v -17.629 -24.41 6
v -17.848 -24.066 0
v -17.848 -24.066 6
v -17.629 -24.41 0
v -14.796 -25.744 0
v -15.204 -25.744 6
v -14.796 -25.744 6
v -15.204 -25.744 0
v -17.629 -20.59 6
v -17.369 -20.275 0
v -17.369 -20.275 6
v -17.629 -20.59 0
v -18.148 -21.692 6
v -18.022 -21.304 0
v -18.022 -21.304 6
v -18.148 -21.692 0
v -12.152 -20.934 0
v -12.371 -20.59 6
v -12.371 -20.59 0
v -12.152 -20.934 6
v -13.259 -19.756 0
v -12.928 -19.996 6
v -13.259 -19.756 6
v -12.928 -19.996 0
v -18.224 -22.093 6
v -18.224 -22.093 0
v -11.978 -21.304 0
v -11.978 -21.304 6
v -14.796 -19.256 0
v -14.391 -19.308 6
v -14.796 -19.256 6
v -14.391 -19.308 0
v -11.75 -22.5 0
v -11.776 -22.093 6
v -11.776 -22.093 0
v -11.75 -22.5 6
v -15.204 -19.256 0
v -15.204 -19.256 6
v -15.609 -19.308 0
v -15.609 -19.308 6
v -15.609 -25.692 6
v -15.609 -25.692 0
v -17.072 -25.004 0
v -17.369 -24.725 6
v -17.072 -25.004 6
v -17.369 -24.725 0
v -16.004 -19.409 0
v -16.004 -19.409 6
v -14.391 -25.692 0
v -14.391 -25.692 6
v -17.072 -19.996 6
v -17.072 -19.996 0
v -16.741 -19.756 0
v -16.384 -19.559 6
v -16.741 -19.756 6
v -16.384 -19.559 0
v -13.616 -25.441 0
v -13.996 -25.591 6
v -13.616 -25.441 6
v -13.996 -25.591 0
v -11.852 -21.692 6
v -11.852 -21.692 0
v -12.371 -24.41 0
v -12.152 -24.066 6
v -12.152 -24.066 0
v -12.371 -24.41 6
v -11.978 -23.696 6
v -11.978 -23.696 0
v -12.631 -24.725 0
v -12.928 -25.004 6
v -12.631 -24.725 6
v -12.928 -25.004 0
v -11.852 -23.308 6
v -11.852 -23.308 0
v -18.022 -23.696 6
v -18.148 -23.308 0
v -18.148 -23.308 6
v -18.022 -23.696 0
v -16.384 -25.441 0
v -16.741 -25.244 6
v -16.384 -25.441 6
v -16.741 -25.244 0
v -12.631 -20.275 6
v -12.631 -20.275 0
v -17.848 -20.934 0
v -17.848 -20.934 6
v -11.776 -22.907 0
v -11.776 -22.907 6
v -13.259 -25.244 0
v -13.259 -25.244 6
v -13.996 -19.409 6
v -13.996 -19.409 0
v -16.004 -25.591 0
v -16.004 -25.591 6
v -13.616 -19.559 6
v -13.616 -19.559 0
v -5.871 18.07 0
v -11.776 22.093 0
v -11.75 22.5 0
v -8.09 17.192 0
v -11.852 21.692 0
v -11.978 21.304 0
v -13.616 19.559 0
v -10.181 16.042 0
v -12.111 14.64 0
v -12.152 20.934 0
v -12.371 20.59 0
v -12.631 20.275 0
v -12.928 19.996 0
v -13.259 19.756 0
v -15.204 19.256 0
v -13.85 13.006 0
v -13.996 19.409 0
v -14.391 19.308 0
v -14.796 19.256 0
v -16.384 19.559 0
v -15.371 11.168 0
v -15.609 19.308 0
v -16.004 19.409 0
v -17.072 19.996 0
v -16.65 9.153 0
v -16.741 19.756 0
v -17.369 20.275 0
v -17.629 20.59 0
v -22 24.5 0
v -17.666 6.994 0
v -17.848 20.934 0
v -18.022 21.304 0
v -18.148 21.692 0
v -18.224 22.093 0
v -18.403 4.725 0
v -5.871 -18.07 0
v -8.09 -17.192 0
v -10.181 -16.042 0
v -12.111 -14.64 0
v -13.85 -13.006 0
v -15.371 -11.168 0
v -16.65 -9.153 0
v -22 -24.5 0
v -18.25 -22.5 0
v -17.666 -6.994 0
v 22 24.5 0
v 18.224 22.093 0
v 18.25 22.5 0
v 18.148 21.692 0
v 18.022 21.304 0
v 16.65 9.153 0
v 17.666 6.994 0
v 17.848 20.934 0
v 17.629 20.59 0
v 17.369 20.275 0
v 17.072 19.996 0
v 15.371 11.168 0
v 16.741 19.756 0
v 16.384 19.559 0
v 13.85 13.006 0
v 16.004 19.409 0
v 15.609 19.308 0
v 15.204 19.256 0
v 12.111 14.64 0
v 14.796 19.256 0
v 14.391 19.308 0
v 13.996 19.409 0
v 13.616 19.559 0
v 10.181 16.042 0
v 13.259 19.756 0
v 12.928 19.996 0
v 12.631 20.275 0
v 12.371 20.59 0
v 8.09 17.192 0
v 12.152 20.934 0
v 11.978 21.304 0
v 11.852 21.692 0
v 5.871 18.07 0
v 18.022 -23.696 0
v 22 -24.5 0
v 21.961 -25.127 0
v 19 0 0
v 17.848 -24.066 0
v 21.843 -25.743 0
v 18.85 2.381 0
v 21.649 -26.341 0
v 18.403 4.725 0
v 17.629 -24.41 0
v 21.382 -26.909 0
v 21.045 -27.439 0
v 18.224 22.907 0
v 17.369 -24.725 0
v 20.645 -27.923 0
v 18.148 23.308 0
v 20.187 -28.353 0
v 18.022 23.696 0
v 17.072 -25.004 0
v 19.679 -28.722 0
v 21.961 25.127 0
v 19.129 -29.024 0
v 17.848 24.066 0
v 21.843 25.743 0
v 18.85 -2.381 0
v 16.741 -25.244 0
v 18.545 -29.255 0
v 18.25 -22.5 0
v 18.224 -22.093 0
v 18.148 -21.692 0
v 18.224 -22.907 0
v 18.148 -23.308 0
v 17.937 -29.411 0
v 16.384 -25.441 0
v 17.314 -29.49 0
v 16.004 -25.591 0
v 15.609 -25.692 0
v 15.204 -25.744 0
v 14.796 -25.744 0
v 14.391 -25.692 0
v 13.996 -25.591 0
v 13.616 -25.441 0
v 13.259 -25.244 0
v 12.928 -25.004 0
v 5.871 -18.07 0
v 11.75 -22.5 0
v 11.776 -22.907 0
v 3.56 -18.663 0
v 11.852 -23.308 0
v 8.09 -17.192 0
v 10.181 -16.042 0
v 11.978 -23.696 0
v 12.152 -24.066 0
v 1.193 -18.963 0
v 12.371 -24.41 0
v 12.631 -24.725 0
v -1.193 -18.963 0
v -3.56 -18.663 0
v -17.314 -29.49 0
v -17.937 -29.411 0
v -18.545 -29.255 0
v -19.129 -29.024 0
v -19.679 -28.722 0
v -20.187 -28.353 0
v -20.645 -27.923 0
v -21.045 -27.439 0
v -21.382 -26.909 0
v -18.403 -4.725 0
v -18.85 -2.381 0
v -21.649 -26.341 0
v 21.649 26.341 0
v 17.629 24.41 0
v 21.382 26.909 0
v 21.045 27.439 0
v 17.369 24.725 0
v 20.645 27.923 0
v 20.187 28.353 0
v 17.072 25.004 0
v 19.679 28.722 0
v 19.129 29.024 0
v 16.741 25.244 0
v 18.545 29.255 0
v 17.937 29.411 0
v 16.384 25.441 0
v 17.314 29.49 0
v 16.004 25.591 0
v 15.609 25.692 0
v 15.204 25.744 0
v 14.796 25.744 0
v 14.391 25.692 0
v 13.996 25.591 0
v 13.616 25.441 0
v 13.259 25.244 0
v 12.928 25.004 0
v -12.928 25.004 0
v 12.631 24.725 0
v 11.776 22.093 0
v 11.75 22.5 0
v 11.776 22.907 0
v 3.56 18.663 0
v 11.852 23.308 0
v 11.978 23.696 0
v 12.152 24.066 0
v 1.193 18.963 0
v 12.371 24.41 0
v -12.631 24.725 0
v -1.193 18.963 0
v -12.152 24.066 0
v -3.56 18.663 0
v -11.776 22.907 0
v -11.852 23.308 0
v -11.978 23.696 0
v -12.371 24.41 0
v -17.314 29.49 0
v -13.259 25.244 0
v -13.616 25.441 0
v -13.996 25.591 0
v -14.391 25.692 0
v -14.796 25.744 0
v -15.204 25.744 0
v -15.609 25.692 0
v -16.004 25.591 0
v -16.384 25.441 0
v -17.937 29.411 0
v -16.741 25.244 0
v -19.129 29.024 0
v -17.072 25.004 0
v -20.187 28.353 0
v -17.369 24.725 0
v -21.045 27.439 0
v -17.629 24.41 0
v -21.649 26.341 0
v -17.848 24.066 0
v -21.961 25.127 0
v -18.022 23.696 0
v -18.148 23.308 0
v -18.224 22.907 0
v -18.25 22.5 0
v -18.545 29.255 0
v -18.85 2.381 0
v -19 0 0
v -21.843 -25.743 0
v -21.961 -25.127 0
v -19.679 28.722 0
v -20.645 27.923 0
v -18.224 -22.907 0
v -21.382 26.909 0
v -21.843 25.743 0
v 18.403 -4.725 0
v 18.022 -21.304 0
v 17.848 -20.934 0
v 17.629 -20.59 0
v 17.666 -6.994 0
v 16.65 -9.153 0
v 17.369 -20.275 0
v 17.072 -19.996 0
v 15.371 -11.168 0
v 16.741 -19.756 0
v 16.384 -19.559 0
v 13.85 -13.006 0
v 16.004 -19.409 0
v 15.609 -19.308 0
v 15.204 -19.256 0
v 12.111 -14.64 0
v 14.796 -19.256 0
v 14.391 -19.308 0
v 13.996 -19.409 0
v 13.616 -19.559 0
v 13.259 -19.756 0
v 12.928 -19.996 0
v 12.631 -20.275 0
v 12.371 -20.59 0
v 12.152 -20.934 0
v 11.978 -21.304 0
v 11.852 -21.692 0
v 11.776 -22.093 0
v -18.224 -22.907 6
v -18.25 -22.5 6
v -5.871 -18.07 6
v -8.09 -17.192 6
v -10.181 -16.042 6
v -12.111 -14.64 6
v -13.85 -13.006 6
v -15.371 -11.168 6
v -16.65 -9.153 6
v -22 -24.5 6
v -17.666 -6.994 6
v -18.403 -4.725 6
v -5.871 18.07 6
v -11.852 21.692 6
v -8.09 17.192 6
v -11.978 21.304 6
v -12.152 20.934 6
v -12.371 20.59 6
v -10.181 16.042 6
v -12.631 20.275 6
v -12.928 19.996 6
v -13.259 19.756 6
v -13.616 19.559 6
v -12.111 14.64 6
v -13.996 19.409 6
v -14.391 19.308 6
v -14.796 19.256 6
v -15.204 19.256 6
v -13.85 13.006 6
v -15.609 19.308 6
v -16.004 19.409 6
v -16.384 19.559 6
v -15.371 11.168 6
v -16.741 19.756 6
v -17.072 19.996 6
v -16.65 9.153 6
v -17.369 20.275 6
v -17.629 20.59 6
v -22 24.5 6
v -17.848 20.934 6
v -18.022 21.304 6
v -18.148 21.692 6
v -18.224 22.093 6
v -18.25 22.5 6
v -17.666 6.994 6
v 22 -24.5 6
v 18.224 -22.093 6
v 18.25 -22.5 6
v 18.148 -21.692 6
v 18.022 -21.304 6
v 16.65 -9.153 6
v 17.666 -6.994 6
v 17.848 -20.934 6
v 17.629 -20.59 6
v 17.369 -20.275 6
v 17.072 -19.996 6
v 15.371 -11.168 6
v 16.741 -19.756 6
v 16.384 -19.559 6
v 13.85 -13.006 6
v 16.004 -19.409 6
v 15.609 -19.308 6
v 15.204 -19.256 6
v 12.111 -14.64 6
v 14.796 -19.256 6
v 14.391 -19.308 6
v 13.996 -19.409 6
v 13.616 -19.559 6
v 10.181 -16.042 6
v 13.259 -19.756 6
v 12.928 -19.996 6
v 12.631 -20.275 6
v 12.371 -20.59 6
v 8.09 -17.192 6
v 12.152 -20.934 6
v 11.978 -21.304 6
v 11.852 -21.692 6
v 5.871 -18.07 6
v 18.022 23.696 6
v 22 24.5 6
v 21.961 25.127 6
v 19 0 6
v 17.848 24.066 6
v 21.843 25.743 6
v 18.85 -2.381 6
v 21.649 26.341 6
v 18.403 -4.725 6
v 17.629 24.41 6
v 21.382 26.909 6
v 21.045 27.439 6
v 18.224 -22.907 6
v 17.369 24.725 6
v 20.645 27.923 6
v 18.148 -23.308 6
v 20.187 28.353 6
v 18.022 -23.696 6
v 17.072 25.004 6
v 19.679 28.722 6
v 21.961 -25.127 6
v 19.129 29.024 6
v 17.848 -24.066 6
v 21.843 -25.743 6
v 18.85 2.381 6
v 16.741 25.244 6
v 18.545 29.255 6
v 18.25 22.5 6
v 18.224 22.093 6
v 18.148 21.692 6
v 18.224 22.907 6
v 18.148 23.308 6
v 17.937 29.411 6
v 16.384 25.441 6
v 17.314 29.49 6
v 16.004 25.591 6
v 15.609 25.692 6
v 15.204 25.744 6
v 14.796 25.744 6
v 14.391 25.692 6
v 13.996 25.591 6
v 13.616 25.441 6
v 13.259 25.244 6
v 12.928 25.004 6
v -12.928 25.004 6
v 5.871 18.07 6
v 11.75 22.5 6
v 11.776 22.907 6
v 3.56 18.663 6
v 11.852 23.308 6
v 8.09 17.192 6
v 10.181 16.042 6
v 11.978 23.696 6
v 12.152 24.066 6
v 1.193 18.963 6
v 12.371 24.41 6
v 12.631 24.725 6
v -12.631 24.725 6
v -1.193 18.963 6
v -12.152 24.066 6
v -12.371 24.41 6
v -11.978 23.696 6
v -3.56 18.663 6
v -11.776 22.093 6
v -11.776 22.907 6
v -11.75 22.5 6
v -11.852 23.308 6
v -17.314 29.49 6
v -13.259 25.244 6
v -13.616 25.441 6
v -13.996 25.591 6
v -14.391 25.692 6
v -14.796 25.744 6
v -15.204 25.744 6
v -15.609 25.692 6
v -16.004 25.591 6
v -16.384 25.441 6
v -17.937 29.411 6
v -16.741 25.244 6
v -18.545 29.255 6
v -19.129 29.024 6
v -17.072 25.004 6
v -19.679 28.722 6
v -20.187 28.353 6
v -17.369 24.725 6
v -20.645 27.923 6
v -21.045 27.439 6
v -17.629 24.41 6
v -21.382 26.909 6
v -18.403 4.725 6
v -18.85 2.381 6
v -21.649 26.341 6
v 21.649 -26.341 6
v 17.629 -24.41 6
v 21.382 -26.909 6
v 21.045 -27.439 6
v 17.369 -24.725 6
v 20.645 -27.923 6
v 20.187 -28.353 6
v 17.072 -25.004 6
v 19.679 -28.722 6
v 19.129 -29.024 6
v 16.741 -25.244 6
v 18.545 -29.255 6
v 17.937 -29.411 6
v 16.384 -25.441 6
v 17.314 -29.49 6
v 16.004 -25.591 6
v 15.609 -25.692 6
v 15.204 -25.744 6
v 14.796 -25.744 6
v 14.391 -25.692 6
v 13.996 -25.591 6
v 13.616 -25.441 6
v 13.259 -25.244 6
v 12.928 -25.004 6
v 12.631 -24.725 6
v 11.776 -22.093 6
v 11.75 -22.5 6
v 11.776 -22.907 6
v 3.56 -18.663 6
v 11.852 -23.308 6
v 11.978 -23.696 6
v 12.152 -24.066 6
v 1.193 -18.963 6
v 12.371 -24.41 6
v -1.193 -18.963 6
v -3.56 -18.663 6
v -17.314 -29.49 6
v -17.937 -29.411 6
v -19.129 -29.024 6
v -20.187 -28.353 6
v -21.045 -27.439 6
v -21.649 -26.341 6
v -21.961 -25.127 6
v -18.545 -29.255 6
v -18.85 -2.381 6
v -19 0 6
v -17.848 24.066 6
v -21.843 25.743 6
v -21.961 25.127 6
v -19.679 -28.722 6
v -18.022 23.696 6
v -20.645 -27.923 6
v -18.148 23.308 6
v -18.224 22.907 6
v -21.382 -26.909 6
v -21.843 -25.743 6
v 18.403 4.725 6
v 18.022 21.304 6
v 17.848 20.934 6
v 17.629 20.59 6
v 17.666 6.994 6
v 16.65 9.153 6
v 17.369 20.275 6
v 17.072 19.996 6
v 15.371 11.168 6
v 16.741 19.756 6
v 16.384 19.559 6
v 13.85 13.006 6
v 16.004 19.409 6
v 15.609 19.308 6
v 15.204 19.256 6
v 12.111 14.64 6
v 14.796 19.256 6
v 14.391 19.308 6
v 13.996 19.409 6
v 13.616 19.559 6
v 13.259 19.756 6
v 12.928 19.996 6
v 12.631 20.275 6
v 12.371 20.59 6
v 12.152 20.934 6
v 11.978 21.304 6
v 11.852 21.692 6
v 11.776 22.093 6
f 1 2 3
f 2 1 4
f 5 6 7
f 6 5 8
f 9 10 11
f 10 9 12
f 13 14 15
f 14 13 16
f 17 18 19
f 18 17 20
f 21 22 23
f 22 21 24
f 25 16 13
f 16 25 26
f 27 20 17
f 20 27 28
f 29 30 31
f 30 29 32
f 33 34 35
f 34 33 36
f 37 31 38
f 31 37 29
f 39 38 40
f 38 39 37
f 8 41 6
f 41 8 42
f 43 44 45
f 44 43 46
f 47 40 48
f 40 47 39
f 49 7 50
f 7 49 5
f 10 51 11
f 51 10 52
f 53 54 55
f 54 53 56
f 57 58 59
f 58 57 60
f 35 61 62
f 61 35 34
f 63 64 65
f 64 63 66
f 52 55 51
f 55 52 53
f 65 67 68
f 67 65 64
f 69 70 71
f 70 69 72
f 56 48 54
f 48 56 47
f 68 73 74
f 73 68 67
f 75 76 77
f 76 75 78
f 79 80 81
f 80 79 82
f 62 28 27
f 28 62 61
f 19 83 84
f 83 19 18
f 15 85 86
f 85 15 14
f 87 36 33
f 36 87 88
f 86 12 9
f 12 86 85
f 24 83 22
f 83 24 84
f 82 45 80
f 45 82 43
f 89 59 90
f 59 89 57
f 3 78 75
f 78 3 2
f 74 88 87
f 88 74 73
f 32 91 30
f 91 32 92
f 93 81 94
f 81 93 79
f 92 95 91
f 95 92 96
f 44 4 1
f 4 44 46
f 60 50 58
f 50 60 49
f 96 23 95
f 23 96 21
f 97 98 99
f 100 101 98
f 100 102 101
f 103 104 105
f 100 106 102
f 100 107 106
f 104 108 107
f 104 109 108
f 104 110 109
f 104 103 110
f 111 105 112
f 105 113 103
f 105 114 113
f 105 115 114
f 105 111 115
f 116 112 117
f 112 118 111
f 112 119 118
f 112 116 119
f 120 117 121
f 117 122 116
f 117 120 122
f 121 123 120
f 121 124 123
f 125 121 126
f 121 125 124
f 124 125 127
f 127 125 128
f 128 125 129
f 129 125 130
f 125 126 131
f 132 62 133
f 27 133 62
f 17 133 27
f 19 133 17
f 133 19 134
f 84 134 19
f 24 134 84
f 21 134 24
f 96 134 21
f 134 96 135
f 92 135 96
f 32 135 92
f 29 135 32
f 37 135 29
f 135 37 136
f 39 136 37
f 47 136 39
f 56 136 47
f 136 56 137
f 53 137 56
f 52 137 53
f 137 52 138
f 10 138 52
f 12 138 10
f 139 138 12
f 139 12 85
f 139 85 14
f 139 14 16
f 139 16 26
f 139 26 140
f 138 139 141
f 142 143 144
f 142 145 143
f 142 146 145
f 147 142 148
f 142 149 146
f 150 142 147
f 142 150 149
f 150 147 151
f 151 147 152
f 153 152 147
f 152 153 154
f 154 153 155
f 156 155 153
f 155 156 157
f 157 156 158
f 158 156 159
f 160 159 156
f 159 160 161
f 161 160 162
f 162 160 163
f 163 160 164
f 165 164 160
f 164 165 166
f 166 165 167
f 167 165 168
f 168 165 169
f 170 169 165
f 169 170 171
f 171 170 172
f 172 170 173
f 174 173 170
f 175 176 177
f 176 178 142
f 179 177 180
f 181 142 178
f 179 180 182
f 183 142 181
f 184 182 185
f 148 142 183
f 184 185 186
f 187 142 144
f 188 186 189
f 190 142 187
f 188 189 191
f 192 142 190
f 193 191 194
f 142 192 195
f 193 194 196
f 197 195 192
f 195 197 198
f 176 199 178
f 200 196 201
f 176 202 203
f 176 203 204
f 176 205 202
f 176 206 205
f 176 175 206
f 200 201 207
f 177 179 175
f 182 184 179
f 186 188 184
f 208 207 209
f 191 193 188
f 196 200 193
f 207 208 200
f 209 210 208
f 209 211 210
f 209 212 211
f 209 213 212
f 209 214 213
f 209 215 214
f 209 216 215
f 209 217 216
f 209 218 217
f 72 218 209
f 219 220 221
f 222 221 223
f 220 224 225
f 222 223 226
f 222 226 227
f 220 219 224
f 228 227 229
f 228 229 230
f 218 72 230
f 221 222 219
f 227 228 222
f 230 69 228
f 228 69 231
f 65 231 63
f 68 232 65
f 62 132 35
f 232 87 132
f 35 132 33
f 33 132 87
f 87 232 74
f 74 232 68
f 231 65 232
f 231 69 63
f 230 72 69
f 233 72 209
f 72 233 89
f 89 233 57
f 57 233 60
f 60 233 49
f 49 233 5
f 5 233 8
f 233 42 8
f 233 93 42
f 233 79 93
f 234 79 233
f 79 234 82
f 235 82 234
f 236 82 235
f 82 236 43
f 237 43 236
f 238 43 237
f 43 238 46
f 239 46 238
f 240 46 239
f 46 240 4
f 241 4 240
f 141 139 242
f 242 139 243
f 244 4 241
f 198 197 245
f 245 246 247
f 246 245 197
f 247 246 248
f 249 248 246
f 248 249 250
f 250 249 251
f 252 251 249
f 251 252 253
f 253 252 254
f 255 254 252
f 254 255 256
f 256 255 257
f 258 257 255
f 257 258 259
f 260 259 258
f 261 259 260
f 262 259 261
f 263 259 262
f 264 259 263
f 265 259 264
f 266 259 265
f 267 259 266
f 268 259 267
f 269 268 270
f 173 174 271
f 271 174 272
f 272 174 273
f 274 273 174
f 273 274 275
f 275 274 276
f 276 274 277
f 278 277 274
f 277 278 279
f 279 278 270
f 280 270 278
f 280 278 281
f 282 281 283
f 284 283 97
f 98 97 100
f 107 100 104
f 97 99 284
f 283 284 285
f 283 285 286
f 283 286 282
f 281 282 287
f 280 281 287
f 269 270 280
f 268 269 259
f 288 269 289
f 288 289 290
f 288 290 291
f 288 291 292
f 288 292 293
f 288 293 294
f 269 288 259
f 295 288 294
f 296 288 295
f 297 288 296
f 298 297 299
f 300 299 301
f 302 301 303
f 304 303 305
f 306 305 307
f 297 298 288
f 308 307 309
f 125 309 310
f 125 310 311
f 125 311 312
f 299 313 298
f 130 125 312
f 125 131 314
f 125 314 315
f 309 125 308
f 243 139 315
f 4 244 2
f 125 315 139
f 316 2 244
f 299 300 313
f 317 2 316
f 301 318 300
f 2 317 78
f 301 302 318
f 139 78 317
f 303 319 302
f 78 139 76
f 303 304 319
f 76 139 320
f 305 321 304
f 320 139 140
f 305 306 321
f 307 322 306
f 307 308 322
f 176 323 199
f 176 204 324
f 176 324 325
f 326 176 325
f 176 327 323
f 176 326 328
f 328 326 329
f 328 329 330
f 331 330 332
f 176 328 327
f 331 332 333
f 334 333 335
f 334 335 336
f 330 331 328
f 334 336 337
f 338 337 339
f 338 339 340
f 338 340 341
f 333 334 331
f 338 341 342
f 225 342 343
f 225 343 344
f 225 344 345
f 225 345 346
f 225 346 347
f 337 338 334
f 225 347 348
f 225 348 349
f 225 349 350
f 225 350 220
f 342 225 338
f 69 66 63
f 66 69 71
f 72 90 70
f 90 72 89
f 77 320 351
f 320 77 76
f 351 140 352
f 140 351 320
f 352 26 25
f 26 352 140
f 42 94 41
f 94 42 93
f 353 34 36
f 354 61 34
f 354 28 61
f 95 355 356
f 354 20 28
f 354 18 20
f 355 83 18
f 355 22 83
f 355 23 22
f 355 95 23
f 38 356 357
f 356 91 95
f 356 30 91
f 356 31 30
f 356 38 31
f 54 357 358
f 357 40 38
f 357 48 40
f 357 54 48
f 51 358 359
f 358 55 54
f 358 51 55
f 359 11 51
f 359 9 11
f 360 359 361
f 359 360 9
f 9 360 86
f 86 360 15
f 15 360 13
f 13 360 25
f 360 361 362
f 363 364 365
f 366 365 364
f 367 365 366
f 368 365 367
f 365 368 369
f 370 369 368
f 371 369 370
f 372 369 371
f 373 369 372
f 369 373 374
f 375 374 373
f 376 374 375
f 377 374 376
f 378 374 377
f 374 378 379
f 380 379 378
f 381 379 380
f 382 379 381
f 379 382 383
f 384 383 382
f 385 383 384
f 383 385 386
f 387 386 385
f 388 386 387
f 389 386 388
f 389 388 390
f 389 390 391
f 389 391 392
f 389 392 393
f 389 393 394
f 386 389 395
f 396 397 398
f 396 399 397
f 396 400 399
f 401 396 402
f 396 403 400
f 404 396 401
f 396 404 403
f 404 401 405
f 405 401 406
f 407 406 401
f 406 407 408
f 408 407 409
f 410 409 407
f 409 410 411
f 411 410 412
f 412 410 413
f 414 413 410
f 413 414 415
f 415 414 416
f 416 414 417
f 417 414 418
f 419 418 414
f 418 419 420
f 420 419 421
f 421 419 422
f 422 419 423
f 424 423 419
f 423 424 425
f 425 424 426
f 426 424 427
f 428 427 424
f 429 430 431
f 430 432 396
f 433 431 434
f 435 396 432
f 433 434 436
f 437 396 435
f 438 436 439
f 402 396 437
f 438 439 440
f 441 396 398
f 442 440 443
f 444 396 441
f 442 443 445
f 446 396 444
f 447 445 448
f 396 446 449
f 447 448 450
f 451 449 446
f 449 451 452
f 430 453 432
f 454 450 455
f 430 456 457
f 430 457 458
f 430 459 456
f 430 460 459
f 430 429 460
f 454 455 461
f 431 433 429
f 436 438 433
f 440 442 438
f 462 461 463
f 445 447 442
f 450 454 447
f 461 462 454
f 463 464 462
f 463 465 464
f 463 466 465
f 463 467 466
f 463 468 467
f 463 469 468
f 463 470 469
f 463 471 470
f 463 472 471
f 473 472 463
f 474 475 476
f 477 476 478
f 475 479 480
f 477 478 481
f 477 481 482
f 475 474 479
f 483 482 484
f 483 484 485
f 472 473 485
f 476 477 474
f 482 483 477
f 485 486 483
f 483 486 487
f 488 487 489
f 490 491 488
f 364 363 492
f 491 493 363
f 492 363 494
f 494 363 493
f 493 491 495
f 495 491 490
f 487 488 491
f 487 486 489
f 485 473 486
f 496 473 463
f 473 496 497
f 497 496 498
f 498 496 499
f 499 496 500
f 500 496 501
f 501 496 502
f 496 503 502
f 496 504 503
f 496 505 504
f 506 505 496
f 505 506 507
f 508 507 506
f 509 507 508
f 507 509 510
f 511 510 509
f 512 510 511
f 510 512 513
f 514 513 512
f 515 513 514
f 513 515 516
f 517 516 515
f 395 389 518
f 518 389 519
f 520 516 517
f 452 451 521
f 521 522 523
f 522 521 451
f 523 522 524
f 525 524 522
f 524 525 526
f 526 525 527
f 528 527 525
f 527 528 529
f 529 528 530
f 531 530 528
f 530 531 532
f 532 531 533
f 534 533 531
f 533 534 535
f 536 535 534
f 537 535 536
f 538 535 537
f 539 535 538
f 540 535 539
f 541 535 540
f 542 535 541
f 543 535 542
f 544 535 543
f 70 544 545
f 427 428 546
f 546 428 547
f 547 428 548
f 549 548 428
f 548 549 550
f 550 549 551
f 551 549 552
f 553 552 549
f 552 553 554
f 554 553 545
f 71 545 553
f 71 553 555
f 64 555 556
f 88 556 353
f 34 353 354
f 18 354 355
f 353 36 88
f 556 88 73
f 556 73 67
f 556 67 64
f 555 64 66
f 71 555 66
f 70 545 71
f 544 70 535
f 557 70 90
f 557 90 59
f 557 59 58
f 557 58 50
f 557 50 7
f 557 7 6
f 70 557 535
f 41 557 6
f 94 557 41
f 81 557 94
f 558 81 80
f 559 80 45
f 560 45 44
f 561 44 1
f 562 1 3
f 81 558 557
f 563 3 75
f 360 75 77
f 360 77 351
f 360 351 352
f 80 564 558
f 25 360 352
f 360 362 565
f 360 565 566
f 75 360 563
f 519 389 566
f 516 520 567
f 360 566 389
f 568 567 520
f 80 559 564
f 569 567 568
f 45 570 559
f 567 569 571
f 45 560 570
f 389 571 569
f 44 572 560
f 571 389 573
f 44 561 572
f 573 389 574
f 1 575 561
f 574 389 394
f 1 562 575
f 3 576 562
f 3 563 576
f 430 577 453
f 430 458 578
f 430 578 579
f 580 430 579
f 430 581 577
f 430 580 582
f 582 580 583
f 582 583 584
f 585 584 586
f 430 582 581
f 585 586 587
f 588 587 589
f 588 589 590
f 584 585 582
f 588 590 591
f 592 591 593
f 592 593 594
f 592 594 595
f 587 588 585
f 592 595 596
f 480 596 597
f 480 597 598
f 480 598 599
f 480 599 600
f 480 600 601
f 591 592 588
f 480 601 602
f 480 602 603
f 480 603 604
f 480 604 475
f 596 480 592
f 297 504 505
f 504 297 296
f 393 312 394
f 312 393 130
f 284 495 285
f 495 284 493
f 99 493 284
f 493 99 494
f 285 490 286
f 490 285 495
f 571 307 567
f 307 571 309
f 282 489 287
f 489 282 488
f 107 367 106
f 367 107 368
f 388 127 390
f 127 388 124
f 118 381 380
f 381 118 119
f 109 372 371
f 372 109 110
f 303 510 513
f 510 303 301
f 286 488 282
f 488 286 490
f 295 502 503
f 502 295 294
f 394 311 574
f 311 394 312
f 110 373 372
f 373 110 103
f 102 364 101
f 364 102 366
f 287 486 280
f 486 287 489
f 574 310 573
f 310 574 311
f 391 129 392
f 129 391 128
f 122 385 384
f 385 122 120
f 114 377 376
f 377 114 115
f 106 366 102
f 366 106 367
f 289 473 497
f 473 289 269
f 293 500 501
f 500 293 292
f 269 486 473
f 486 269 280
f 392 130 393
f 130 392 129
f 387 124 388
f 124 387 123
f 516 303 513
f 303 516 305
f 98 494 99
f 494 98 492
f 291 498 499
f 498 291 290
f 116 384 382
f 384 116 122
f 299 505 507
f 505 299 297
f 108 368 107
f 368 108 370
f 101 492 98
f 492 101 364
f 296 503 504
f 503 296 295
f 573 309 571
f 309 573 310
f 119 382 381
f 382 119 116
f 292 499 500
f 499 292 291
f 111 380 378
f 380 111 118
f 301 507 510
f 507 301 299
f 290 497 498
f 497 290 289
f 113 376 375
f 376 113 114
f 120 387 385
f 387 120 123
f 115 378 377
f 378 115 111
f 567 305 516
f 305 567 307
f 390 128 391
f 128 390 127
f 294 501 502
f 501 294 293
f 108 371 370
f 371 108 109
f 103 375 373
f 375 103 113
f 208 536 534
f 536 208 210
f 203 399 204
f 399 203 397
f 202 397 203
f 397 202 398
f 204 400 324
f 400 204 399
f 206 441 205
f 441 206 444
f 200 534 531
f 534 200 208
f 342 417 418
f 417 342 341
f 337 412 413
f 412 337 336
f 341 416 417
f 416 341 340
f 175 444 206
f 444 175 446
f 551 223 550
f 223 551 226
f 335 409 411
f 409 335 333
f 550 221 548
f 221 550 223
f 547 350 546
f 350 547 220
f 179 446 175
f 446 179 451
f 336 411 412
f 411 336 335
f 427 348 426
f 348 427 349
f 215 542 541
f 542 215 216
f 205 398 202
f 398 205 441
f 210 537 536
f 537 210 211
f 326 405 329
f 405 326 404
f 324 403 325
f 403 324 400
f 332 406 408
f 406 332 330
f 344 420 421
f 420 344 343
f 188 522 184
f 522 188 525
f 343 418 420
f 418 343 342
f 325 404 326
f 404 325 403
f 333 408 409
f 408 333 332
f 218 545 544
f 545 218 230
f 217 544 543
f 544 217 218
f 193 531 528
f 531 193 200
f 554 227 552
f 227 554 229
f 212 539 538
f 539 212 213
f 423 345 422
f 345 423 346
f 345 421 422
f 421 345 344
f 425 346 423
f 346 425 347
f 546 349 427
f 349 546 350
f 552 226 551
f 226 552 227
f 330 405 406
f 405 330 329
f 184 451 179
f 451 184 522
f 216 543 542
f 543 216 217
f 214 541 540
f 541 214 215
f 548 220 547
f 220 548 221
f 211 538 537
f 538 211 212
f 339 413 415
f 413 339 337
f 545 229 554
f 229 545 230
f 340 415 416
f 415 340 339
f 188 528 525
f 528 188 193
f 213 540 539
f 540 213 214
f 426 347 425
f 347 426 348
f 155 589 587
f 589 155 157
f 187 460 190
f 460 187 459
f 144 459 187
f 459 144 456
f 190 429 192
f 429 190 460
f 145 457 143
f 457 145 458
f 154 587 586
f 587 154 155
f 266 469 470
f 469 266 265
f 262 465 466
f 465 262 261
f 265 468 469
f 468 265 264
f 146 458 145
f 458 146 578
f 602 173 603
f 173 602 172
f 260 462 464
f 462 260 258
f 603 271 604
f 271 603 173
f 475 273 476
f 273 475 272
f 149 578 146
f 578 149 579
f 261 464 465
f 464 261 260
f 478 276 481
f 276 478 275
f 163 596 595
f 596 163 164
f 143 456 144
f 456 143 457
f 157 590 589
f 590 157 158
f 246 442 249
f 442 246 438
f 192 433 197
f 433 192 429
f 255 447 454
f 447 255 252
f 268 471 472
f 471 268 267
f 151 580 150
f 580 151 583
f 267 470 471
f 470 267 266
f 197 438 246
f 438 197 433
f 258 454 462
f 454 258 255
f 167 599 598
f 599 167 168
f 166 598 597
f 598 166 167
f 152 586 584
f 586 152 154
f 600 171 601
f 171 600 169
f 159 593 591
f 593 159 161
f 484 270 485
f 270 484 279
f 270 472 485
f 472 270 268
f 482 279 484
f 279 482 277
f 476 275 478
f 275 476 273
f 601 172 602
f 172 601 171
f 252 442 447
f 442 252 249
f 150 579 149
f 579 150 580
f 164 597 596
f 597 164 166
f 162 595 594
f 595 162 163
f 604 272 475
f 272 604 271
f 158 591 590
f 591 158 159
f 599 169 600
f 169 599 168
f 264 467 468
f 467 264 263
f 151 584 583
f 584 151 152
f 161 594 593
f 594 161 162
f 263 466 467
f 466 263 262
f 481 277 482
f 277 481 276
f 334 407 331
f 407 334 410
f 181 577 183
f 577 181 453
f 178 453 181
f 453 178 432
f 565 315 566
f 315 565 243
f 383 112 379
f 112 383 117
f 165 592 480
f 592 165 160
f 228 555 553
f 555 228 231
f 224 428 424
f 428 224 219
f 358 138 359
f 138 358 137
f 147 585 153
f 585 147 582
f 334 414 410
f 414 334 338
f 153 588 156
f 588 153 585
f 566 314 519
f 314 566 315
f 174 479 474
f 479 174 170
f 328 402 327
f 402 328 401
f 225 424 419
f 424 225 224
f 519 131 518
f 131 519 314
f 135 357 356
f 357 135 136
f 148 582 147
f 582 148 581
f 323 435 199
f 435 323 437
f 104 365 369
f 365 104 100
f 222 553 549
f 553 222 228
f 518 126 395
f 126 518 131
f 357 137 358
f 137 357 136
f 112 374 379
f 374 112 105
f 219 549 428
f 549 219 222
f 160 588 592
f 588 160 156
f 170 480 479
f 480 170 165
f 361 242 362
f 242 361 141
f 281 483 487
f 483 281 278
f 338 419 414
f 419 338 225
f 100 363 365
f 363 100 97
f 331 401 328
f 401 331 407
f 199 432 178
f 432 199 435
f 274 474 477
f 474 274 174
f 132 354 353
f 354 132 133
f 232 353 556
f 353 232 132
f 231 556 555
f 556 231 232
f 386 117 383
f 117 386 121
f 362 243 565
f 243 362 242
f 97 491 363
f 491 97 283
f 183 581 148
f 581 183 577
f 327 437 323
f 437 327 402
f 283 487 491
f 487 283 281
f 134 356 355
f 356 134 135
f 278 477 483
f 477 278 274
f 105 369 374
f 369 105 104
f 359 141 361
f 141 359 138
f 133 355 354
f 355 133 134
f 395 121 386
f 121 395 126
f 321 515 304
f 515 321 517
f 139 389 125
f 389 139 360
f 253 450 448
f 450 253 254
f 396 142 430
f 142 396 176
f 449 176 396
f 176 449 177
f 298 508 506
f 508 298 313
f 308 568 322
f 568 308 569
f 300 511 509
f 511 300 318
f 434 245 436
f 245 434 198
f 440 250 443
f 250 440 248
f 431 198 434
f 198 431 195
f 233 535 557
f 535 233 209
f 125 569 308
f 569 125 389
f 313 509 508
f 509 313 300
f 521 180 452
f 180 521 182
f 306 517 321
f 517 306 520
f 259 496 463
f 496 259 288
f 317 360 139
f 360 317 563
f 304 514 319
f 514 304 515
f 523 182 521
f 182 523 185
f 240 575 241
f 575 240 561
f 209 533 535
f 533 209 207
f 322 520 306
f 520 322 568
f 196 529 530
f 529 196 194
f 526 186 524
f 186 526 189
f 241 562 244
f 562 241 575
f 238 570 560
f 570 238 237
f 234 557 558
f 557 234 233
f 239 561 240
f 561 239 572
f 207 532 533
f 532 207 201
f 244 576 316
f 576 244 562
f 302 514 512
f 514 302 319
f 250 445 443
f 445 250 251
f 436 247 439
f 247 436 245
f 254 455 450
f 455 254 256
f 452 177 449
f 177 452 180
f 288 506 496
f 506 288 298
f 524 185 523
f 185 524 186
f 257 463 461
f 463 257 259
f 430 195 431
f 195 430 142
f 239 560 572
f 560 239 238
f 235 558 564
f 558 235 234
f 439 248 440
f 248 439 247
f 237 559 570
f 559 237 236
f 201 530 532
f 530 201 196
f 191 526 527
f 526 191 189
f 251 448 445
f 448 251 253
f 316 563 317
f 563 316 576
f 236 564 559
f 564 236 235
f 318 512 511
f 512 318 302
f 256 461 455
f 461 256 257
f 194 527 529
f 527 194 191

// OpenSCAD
$fn = 50;

difference() {
	union() {
		hull() {
			translate(v = [-17.0, 24.5, 0]) {
				cylinder(h = 6, r = 5);
			}
			translate(v = [17.0, 24.5, 0]) {
				cylinder(h = 6, r = 5);
			}
			translate(v = [-17.0, -24.5, 0]) {
				cylinder(h = 6, r = 5);
			}
			translate(v = [17.0, -24.5, 0]) {
				cylinder(h = 6, r = 5);
			}
		}
	}
	union() {
		translate(v = [-15.0, -22.5, 0]) {
			cylinder(h = 6, r = 3.25);
		}
		translate(v = [-15.0, 22.5, 0]) {
			cylinder(h = 6, r = 3.25);
		}
		translate(v = [15.0, -22.5, 0]) {
			cylinder(h = 6, r = 3.25);
		}
		translate(v = [15.0, 22.5, 0]) {
			cylinder(h = 6, r = 3.25);
		}
		cylinder(h = 6, r = 19.0);
	}
}
